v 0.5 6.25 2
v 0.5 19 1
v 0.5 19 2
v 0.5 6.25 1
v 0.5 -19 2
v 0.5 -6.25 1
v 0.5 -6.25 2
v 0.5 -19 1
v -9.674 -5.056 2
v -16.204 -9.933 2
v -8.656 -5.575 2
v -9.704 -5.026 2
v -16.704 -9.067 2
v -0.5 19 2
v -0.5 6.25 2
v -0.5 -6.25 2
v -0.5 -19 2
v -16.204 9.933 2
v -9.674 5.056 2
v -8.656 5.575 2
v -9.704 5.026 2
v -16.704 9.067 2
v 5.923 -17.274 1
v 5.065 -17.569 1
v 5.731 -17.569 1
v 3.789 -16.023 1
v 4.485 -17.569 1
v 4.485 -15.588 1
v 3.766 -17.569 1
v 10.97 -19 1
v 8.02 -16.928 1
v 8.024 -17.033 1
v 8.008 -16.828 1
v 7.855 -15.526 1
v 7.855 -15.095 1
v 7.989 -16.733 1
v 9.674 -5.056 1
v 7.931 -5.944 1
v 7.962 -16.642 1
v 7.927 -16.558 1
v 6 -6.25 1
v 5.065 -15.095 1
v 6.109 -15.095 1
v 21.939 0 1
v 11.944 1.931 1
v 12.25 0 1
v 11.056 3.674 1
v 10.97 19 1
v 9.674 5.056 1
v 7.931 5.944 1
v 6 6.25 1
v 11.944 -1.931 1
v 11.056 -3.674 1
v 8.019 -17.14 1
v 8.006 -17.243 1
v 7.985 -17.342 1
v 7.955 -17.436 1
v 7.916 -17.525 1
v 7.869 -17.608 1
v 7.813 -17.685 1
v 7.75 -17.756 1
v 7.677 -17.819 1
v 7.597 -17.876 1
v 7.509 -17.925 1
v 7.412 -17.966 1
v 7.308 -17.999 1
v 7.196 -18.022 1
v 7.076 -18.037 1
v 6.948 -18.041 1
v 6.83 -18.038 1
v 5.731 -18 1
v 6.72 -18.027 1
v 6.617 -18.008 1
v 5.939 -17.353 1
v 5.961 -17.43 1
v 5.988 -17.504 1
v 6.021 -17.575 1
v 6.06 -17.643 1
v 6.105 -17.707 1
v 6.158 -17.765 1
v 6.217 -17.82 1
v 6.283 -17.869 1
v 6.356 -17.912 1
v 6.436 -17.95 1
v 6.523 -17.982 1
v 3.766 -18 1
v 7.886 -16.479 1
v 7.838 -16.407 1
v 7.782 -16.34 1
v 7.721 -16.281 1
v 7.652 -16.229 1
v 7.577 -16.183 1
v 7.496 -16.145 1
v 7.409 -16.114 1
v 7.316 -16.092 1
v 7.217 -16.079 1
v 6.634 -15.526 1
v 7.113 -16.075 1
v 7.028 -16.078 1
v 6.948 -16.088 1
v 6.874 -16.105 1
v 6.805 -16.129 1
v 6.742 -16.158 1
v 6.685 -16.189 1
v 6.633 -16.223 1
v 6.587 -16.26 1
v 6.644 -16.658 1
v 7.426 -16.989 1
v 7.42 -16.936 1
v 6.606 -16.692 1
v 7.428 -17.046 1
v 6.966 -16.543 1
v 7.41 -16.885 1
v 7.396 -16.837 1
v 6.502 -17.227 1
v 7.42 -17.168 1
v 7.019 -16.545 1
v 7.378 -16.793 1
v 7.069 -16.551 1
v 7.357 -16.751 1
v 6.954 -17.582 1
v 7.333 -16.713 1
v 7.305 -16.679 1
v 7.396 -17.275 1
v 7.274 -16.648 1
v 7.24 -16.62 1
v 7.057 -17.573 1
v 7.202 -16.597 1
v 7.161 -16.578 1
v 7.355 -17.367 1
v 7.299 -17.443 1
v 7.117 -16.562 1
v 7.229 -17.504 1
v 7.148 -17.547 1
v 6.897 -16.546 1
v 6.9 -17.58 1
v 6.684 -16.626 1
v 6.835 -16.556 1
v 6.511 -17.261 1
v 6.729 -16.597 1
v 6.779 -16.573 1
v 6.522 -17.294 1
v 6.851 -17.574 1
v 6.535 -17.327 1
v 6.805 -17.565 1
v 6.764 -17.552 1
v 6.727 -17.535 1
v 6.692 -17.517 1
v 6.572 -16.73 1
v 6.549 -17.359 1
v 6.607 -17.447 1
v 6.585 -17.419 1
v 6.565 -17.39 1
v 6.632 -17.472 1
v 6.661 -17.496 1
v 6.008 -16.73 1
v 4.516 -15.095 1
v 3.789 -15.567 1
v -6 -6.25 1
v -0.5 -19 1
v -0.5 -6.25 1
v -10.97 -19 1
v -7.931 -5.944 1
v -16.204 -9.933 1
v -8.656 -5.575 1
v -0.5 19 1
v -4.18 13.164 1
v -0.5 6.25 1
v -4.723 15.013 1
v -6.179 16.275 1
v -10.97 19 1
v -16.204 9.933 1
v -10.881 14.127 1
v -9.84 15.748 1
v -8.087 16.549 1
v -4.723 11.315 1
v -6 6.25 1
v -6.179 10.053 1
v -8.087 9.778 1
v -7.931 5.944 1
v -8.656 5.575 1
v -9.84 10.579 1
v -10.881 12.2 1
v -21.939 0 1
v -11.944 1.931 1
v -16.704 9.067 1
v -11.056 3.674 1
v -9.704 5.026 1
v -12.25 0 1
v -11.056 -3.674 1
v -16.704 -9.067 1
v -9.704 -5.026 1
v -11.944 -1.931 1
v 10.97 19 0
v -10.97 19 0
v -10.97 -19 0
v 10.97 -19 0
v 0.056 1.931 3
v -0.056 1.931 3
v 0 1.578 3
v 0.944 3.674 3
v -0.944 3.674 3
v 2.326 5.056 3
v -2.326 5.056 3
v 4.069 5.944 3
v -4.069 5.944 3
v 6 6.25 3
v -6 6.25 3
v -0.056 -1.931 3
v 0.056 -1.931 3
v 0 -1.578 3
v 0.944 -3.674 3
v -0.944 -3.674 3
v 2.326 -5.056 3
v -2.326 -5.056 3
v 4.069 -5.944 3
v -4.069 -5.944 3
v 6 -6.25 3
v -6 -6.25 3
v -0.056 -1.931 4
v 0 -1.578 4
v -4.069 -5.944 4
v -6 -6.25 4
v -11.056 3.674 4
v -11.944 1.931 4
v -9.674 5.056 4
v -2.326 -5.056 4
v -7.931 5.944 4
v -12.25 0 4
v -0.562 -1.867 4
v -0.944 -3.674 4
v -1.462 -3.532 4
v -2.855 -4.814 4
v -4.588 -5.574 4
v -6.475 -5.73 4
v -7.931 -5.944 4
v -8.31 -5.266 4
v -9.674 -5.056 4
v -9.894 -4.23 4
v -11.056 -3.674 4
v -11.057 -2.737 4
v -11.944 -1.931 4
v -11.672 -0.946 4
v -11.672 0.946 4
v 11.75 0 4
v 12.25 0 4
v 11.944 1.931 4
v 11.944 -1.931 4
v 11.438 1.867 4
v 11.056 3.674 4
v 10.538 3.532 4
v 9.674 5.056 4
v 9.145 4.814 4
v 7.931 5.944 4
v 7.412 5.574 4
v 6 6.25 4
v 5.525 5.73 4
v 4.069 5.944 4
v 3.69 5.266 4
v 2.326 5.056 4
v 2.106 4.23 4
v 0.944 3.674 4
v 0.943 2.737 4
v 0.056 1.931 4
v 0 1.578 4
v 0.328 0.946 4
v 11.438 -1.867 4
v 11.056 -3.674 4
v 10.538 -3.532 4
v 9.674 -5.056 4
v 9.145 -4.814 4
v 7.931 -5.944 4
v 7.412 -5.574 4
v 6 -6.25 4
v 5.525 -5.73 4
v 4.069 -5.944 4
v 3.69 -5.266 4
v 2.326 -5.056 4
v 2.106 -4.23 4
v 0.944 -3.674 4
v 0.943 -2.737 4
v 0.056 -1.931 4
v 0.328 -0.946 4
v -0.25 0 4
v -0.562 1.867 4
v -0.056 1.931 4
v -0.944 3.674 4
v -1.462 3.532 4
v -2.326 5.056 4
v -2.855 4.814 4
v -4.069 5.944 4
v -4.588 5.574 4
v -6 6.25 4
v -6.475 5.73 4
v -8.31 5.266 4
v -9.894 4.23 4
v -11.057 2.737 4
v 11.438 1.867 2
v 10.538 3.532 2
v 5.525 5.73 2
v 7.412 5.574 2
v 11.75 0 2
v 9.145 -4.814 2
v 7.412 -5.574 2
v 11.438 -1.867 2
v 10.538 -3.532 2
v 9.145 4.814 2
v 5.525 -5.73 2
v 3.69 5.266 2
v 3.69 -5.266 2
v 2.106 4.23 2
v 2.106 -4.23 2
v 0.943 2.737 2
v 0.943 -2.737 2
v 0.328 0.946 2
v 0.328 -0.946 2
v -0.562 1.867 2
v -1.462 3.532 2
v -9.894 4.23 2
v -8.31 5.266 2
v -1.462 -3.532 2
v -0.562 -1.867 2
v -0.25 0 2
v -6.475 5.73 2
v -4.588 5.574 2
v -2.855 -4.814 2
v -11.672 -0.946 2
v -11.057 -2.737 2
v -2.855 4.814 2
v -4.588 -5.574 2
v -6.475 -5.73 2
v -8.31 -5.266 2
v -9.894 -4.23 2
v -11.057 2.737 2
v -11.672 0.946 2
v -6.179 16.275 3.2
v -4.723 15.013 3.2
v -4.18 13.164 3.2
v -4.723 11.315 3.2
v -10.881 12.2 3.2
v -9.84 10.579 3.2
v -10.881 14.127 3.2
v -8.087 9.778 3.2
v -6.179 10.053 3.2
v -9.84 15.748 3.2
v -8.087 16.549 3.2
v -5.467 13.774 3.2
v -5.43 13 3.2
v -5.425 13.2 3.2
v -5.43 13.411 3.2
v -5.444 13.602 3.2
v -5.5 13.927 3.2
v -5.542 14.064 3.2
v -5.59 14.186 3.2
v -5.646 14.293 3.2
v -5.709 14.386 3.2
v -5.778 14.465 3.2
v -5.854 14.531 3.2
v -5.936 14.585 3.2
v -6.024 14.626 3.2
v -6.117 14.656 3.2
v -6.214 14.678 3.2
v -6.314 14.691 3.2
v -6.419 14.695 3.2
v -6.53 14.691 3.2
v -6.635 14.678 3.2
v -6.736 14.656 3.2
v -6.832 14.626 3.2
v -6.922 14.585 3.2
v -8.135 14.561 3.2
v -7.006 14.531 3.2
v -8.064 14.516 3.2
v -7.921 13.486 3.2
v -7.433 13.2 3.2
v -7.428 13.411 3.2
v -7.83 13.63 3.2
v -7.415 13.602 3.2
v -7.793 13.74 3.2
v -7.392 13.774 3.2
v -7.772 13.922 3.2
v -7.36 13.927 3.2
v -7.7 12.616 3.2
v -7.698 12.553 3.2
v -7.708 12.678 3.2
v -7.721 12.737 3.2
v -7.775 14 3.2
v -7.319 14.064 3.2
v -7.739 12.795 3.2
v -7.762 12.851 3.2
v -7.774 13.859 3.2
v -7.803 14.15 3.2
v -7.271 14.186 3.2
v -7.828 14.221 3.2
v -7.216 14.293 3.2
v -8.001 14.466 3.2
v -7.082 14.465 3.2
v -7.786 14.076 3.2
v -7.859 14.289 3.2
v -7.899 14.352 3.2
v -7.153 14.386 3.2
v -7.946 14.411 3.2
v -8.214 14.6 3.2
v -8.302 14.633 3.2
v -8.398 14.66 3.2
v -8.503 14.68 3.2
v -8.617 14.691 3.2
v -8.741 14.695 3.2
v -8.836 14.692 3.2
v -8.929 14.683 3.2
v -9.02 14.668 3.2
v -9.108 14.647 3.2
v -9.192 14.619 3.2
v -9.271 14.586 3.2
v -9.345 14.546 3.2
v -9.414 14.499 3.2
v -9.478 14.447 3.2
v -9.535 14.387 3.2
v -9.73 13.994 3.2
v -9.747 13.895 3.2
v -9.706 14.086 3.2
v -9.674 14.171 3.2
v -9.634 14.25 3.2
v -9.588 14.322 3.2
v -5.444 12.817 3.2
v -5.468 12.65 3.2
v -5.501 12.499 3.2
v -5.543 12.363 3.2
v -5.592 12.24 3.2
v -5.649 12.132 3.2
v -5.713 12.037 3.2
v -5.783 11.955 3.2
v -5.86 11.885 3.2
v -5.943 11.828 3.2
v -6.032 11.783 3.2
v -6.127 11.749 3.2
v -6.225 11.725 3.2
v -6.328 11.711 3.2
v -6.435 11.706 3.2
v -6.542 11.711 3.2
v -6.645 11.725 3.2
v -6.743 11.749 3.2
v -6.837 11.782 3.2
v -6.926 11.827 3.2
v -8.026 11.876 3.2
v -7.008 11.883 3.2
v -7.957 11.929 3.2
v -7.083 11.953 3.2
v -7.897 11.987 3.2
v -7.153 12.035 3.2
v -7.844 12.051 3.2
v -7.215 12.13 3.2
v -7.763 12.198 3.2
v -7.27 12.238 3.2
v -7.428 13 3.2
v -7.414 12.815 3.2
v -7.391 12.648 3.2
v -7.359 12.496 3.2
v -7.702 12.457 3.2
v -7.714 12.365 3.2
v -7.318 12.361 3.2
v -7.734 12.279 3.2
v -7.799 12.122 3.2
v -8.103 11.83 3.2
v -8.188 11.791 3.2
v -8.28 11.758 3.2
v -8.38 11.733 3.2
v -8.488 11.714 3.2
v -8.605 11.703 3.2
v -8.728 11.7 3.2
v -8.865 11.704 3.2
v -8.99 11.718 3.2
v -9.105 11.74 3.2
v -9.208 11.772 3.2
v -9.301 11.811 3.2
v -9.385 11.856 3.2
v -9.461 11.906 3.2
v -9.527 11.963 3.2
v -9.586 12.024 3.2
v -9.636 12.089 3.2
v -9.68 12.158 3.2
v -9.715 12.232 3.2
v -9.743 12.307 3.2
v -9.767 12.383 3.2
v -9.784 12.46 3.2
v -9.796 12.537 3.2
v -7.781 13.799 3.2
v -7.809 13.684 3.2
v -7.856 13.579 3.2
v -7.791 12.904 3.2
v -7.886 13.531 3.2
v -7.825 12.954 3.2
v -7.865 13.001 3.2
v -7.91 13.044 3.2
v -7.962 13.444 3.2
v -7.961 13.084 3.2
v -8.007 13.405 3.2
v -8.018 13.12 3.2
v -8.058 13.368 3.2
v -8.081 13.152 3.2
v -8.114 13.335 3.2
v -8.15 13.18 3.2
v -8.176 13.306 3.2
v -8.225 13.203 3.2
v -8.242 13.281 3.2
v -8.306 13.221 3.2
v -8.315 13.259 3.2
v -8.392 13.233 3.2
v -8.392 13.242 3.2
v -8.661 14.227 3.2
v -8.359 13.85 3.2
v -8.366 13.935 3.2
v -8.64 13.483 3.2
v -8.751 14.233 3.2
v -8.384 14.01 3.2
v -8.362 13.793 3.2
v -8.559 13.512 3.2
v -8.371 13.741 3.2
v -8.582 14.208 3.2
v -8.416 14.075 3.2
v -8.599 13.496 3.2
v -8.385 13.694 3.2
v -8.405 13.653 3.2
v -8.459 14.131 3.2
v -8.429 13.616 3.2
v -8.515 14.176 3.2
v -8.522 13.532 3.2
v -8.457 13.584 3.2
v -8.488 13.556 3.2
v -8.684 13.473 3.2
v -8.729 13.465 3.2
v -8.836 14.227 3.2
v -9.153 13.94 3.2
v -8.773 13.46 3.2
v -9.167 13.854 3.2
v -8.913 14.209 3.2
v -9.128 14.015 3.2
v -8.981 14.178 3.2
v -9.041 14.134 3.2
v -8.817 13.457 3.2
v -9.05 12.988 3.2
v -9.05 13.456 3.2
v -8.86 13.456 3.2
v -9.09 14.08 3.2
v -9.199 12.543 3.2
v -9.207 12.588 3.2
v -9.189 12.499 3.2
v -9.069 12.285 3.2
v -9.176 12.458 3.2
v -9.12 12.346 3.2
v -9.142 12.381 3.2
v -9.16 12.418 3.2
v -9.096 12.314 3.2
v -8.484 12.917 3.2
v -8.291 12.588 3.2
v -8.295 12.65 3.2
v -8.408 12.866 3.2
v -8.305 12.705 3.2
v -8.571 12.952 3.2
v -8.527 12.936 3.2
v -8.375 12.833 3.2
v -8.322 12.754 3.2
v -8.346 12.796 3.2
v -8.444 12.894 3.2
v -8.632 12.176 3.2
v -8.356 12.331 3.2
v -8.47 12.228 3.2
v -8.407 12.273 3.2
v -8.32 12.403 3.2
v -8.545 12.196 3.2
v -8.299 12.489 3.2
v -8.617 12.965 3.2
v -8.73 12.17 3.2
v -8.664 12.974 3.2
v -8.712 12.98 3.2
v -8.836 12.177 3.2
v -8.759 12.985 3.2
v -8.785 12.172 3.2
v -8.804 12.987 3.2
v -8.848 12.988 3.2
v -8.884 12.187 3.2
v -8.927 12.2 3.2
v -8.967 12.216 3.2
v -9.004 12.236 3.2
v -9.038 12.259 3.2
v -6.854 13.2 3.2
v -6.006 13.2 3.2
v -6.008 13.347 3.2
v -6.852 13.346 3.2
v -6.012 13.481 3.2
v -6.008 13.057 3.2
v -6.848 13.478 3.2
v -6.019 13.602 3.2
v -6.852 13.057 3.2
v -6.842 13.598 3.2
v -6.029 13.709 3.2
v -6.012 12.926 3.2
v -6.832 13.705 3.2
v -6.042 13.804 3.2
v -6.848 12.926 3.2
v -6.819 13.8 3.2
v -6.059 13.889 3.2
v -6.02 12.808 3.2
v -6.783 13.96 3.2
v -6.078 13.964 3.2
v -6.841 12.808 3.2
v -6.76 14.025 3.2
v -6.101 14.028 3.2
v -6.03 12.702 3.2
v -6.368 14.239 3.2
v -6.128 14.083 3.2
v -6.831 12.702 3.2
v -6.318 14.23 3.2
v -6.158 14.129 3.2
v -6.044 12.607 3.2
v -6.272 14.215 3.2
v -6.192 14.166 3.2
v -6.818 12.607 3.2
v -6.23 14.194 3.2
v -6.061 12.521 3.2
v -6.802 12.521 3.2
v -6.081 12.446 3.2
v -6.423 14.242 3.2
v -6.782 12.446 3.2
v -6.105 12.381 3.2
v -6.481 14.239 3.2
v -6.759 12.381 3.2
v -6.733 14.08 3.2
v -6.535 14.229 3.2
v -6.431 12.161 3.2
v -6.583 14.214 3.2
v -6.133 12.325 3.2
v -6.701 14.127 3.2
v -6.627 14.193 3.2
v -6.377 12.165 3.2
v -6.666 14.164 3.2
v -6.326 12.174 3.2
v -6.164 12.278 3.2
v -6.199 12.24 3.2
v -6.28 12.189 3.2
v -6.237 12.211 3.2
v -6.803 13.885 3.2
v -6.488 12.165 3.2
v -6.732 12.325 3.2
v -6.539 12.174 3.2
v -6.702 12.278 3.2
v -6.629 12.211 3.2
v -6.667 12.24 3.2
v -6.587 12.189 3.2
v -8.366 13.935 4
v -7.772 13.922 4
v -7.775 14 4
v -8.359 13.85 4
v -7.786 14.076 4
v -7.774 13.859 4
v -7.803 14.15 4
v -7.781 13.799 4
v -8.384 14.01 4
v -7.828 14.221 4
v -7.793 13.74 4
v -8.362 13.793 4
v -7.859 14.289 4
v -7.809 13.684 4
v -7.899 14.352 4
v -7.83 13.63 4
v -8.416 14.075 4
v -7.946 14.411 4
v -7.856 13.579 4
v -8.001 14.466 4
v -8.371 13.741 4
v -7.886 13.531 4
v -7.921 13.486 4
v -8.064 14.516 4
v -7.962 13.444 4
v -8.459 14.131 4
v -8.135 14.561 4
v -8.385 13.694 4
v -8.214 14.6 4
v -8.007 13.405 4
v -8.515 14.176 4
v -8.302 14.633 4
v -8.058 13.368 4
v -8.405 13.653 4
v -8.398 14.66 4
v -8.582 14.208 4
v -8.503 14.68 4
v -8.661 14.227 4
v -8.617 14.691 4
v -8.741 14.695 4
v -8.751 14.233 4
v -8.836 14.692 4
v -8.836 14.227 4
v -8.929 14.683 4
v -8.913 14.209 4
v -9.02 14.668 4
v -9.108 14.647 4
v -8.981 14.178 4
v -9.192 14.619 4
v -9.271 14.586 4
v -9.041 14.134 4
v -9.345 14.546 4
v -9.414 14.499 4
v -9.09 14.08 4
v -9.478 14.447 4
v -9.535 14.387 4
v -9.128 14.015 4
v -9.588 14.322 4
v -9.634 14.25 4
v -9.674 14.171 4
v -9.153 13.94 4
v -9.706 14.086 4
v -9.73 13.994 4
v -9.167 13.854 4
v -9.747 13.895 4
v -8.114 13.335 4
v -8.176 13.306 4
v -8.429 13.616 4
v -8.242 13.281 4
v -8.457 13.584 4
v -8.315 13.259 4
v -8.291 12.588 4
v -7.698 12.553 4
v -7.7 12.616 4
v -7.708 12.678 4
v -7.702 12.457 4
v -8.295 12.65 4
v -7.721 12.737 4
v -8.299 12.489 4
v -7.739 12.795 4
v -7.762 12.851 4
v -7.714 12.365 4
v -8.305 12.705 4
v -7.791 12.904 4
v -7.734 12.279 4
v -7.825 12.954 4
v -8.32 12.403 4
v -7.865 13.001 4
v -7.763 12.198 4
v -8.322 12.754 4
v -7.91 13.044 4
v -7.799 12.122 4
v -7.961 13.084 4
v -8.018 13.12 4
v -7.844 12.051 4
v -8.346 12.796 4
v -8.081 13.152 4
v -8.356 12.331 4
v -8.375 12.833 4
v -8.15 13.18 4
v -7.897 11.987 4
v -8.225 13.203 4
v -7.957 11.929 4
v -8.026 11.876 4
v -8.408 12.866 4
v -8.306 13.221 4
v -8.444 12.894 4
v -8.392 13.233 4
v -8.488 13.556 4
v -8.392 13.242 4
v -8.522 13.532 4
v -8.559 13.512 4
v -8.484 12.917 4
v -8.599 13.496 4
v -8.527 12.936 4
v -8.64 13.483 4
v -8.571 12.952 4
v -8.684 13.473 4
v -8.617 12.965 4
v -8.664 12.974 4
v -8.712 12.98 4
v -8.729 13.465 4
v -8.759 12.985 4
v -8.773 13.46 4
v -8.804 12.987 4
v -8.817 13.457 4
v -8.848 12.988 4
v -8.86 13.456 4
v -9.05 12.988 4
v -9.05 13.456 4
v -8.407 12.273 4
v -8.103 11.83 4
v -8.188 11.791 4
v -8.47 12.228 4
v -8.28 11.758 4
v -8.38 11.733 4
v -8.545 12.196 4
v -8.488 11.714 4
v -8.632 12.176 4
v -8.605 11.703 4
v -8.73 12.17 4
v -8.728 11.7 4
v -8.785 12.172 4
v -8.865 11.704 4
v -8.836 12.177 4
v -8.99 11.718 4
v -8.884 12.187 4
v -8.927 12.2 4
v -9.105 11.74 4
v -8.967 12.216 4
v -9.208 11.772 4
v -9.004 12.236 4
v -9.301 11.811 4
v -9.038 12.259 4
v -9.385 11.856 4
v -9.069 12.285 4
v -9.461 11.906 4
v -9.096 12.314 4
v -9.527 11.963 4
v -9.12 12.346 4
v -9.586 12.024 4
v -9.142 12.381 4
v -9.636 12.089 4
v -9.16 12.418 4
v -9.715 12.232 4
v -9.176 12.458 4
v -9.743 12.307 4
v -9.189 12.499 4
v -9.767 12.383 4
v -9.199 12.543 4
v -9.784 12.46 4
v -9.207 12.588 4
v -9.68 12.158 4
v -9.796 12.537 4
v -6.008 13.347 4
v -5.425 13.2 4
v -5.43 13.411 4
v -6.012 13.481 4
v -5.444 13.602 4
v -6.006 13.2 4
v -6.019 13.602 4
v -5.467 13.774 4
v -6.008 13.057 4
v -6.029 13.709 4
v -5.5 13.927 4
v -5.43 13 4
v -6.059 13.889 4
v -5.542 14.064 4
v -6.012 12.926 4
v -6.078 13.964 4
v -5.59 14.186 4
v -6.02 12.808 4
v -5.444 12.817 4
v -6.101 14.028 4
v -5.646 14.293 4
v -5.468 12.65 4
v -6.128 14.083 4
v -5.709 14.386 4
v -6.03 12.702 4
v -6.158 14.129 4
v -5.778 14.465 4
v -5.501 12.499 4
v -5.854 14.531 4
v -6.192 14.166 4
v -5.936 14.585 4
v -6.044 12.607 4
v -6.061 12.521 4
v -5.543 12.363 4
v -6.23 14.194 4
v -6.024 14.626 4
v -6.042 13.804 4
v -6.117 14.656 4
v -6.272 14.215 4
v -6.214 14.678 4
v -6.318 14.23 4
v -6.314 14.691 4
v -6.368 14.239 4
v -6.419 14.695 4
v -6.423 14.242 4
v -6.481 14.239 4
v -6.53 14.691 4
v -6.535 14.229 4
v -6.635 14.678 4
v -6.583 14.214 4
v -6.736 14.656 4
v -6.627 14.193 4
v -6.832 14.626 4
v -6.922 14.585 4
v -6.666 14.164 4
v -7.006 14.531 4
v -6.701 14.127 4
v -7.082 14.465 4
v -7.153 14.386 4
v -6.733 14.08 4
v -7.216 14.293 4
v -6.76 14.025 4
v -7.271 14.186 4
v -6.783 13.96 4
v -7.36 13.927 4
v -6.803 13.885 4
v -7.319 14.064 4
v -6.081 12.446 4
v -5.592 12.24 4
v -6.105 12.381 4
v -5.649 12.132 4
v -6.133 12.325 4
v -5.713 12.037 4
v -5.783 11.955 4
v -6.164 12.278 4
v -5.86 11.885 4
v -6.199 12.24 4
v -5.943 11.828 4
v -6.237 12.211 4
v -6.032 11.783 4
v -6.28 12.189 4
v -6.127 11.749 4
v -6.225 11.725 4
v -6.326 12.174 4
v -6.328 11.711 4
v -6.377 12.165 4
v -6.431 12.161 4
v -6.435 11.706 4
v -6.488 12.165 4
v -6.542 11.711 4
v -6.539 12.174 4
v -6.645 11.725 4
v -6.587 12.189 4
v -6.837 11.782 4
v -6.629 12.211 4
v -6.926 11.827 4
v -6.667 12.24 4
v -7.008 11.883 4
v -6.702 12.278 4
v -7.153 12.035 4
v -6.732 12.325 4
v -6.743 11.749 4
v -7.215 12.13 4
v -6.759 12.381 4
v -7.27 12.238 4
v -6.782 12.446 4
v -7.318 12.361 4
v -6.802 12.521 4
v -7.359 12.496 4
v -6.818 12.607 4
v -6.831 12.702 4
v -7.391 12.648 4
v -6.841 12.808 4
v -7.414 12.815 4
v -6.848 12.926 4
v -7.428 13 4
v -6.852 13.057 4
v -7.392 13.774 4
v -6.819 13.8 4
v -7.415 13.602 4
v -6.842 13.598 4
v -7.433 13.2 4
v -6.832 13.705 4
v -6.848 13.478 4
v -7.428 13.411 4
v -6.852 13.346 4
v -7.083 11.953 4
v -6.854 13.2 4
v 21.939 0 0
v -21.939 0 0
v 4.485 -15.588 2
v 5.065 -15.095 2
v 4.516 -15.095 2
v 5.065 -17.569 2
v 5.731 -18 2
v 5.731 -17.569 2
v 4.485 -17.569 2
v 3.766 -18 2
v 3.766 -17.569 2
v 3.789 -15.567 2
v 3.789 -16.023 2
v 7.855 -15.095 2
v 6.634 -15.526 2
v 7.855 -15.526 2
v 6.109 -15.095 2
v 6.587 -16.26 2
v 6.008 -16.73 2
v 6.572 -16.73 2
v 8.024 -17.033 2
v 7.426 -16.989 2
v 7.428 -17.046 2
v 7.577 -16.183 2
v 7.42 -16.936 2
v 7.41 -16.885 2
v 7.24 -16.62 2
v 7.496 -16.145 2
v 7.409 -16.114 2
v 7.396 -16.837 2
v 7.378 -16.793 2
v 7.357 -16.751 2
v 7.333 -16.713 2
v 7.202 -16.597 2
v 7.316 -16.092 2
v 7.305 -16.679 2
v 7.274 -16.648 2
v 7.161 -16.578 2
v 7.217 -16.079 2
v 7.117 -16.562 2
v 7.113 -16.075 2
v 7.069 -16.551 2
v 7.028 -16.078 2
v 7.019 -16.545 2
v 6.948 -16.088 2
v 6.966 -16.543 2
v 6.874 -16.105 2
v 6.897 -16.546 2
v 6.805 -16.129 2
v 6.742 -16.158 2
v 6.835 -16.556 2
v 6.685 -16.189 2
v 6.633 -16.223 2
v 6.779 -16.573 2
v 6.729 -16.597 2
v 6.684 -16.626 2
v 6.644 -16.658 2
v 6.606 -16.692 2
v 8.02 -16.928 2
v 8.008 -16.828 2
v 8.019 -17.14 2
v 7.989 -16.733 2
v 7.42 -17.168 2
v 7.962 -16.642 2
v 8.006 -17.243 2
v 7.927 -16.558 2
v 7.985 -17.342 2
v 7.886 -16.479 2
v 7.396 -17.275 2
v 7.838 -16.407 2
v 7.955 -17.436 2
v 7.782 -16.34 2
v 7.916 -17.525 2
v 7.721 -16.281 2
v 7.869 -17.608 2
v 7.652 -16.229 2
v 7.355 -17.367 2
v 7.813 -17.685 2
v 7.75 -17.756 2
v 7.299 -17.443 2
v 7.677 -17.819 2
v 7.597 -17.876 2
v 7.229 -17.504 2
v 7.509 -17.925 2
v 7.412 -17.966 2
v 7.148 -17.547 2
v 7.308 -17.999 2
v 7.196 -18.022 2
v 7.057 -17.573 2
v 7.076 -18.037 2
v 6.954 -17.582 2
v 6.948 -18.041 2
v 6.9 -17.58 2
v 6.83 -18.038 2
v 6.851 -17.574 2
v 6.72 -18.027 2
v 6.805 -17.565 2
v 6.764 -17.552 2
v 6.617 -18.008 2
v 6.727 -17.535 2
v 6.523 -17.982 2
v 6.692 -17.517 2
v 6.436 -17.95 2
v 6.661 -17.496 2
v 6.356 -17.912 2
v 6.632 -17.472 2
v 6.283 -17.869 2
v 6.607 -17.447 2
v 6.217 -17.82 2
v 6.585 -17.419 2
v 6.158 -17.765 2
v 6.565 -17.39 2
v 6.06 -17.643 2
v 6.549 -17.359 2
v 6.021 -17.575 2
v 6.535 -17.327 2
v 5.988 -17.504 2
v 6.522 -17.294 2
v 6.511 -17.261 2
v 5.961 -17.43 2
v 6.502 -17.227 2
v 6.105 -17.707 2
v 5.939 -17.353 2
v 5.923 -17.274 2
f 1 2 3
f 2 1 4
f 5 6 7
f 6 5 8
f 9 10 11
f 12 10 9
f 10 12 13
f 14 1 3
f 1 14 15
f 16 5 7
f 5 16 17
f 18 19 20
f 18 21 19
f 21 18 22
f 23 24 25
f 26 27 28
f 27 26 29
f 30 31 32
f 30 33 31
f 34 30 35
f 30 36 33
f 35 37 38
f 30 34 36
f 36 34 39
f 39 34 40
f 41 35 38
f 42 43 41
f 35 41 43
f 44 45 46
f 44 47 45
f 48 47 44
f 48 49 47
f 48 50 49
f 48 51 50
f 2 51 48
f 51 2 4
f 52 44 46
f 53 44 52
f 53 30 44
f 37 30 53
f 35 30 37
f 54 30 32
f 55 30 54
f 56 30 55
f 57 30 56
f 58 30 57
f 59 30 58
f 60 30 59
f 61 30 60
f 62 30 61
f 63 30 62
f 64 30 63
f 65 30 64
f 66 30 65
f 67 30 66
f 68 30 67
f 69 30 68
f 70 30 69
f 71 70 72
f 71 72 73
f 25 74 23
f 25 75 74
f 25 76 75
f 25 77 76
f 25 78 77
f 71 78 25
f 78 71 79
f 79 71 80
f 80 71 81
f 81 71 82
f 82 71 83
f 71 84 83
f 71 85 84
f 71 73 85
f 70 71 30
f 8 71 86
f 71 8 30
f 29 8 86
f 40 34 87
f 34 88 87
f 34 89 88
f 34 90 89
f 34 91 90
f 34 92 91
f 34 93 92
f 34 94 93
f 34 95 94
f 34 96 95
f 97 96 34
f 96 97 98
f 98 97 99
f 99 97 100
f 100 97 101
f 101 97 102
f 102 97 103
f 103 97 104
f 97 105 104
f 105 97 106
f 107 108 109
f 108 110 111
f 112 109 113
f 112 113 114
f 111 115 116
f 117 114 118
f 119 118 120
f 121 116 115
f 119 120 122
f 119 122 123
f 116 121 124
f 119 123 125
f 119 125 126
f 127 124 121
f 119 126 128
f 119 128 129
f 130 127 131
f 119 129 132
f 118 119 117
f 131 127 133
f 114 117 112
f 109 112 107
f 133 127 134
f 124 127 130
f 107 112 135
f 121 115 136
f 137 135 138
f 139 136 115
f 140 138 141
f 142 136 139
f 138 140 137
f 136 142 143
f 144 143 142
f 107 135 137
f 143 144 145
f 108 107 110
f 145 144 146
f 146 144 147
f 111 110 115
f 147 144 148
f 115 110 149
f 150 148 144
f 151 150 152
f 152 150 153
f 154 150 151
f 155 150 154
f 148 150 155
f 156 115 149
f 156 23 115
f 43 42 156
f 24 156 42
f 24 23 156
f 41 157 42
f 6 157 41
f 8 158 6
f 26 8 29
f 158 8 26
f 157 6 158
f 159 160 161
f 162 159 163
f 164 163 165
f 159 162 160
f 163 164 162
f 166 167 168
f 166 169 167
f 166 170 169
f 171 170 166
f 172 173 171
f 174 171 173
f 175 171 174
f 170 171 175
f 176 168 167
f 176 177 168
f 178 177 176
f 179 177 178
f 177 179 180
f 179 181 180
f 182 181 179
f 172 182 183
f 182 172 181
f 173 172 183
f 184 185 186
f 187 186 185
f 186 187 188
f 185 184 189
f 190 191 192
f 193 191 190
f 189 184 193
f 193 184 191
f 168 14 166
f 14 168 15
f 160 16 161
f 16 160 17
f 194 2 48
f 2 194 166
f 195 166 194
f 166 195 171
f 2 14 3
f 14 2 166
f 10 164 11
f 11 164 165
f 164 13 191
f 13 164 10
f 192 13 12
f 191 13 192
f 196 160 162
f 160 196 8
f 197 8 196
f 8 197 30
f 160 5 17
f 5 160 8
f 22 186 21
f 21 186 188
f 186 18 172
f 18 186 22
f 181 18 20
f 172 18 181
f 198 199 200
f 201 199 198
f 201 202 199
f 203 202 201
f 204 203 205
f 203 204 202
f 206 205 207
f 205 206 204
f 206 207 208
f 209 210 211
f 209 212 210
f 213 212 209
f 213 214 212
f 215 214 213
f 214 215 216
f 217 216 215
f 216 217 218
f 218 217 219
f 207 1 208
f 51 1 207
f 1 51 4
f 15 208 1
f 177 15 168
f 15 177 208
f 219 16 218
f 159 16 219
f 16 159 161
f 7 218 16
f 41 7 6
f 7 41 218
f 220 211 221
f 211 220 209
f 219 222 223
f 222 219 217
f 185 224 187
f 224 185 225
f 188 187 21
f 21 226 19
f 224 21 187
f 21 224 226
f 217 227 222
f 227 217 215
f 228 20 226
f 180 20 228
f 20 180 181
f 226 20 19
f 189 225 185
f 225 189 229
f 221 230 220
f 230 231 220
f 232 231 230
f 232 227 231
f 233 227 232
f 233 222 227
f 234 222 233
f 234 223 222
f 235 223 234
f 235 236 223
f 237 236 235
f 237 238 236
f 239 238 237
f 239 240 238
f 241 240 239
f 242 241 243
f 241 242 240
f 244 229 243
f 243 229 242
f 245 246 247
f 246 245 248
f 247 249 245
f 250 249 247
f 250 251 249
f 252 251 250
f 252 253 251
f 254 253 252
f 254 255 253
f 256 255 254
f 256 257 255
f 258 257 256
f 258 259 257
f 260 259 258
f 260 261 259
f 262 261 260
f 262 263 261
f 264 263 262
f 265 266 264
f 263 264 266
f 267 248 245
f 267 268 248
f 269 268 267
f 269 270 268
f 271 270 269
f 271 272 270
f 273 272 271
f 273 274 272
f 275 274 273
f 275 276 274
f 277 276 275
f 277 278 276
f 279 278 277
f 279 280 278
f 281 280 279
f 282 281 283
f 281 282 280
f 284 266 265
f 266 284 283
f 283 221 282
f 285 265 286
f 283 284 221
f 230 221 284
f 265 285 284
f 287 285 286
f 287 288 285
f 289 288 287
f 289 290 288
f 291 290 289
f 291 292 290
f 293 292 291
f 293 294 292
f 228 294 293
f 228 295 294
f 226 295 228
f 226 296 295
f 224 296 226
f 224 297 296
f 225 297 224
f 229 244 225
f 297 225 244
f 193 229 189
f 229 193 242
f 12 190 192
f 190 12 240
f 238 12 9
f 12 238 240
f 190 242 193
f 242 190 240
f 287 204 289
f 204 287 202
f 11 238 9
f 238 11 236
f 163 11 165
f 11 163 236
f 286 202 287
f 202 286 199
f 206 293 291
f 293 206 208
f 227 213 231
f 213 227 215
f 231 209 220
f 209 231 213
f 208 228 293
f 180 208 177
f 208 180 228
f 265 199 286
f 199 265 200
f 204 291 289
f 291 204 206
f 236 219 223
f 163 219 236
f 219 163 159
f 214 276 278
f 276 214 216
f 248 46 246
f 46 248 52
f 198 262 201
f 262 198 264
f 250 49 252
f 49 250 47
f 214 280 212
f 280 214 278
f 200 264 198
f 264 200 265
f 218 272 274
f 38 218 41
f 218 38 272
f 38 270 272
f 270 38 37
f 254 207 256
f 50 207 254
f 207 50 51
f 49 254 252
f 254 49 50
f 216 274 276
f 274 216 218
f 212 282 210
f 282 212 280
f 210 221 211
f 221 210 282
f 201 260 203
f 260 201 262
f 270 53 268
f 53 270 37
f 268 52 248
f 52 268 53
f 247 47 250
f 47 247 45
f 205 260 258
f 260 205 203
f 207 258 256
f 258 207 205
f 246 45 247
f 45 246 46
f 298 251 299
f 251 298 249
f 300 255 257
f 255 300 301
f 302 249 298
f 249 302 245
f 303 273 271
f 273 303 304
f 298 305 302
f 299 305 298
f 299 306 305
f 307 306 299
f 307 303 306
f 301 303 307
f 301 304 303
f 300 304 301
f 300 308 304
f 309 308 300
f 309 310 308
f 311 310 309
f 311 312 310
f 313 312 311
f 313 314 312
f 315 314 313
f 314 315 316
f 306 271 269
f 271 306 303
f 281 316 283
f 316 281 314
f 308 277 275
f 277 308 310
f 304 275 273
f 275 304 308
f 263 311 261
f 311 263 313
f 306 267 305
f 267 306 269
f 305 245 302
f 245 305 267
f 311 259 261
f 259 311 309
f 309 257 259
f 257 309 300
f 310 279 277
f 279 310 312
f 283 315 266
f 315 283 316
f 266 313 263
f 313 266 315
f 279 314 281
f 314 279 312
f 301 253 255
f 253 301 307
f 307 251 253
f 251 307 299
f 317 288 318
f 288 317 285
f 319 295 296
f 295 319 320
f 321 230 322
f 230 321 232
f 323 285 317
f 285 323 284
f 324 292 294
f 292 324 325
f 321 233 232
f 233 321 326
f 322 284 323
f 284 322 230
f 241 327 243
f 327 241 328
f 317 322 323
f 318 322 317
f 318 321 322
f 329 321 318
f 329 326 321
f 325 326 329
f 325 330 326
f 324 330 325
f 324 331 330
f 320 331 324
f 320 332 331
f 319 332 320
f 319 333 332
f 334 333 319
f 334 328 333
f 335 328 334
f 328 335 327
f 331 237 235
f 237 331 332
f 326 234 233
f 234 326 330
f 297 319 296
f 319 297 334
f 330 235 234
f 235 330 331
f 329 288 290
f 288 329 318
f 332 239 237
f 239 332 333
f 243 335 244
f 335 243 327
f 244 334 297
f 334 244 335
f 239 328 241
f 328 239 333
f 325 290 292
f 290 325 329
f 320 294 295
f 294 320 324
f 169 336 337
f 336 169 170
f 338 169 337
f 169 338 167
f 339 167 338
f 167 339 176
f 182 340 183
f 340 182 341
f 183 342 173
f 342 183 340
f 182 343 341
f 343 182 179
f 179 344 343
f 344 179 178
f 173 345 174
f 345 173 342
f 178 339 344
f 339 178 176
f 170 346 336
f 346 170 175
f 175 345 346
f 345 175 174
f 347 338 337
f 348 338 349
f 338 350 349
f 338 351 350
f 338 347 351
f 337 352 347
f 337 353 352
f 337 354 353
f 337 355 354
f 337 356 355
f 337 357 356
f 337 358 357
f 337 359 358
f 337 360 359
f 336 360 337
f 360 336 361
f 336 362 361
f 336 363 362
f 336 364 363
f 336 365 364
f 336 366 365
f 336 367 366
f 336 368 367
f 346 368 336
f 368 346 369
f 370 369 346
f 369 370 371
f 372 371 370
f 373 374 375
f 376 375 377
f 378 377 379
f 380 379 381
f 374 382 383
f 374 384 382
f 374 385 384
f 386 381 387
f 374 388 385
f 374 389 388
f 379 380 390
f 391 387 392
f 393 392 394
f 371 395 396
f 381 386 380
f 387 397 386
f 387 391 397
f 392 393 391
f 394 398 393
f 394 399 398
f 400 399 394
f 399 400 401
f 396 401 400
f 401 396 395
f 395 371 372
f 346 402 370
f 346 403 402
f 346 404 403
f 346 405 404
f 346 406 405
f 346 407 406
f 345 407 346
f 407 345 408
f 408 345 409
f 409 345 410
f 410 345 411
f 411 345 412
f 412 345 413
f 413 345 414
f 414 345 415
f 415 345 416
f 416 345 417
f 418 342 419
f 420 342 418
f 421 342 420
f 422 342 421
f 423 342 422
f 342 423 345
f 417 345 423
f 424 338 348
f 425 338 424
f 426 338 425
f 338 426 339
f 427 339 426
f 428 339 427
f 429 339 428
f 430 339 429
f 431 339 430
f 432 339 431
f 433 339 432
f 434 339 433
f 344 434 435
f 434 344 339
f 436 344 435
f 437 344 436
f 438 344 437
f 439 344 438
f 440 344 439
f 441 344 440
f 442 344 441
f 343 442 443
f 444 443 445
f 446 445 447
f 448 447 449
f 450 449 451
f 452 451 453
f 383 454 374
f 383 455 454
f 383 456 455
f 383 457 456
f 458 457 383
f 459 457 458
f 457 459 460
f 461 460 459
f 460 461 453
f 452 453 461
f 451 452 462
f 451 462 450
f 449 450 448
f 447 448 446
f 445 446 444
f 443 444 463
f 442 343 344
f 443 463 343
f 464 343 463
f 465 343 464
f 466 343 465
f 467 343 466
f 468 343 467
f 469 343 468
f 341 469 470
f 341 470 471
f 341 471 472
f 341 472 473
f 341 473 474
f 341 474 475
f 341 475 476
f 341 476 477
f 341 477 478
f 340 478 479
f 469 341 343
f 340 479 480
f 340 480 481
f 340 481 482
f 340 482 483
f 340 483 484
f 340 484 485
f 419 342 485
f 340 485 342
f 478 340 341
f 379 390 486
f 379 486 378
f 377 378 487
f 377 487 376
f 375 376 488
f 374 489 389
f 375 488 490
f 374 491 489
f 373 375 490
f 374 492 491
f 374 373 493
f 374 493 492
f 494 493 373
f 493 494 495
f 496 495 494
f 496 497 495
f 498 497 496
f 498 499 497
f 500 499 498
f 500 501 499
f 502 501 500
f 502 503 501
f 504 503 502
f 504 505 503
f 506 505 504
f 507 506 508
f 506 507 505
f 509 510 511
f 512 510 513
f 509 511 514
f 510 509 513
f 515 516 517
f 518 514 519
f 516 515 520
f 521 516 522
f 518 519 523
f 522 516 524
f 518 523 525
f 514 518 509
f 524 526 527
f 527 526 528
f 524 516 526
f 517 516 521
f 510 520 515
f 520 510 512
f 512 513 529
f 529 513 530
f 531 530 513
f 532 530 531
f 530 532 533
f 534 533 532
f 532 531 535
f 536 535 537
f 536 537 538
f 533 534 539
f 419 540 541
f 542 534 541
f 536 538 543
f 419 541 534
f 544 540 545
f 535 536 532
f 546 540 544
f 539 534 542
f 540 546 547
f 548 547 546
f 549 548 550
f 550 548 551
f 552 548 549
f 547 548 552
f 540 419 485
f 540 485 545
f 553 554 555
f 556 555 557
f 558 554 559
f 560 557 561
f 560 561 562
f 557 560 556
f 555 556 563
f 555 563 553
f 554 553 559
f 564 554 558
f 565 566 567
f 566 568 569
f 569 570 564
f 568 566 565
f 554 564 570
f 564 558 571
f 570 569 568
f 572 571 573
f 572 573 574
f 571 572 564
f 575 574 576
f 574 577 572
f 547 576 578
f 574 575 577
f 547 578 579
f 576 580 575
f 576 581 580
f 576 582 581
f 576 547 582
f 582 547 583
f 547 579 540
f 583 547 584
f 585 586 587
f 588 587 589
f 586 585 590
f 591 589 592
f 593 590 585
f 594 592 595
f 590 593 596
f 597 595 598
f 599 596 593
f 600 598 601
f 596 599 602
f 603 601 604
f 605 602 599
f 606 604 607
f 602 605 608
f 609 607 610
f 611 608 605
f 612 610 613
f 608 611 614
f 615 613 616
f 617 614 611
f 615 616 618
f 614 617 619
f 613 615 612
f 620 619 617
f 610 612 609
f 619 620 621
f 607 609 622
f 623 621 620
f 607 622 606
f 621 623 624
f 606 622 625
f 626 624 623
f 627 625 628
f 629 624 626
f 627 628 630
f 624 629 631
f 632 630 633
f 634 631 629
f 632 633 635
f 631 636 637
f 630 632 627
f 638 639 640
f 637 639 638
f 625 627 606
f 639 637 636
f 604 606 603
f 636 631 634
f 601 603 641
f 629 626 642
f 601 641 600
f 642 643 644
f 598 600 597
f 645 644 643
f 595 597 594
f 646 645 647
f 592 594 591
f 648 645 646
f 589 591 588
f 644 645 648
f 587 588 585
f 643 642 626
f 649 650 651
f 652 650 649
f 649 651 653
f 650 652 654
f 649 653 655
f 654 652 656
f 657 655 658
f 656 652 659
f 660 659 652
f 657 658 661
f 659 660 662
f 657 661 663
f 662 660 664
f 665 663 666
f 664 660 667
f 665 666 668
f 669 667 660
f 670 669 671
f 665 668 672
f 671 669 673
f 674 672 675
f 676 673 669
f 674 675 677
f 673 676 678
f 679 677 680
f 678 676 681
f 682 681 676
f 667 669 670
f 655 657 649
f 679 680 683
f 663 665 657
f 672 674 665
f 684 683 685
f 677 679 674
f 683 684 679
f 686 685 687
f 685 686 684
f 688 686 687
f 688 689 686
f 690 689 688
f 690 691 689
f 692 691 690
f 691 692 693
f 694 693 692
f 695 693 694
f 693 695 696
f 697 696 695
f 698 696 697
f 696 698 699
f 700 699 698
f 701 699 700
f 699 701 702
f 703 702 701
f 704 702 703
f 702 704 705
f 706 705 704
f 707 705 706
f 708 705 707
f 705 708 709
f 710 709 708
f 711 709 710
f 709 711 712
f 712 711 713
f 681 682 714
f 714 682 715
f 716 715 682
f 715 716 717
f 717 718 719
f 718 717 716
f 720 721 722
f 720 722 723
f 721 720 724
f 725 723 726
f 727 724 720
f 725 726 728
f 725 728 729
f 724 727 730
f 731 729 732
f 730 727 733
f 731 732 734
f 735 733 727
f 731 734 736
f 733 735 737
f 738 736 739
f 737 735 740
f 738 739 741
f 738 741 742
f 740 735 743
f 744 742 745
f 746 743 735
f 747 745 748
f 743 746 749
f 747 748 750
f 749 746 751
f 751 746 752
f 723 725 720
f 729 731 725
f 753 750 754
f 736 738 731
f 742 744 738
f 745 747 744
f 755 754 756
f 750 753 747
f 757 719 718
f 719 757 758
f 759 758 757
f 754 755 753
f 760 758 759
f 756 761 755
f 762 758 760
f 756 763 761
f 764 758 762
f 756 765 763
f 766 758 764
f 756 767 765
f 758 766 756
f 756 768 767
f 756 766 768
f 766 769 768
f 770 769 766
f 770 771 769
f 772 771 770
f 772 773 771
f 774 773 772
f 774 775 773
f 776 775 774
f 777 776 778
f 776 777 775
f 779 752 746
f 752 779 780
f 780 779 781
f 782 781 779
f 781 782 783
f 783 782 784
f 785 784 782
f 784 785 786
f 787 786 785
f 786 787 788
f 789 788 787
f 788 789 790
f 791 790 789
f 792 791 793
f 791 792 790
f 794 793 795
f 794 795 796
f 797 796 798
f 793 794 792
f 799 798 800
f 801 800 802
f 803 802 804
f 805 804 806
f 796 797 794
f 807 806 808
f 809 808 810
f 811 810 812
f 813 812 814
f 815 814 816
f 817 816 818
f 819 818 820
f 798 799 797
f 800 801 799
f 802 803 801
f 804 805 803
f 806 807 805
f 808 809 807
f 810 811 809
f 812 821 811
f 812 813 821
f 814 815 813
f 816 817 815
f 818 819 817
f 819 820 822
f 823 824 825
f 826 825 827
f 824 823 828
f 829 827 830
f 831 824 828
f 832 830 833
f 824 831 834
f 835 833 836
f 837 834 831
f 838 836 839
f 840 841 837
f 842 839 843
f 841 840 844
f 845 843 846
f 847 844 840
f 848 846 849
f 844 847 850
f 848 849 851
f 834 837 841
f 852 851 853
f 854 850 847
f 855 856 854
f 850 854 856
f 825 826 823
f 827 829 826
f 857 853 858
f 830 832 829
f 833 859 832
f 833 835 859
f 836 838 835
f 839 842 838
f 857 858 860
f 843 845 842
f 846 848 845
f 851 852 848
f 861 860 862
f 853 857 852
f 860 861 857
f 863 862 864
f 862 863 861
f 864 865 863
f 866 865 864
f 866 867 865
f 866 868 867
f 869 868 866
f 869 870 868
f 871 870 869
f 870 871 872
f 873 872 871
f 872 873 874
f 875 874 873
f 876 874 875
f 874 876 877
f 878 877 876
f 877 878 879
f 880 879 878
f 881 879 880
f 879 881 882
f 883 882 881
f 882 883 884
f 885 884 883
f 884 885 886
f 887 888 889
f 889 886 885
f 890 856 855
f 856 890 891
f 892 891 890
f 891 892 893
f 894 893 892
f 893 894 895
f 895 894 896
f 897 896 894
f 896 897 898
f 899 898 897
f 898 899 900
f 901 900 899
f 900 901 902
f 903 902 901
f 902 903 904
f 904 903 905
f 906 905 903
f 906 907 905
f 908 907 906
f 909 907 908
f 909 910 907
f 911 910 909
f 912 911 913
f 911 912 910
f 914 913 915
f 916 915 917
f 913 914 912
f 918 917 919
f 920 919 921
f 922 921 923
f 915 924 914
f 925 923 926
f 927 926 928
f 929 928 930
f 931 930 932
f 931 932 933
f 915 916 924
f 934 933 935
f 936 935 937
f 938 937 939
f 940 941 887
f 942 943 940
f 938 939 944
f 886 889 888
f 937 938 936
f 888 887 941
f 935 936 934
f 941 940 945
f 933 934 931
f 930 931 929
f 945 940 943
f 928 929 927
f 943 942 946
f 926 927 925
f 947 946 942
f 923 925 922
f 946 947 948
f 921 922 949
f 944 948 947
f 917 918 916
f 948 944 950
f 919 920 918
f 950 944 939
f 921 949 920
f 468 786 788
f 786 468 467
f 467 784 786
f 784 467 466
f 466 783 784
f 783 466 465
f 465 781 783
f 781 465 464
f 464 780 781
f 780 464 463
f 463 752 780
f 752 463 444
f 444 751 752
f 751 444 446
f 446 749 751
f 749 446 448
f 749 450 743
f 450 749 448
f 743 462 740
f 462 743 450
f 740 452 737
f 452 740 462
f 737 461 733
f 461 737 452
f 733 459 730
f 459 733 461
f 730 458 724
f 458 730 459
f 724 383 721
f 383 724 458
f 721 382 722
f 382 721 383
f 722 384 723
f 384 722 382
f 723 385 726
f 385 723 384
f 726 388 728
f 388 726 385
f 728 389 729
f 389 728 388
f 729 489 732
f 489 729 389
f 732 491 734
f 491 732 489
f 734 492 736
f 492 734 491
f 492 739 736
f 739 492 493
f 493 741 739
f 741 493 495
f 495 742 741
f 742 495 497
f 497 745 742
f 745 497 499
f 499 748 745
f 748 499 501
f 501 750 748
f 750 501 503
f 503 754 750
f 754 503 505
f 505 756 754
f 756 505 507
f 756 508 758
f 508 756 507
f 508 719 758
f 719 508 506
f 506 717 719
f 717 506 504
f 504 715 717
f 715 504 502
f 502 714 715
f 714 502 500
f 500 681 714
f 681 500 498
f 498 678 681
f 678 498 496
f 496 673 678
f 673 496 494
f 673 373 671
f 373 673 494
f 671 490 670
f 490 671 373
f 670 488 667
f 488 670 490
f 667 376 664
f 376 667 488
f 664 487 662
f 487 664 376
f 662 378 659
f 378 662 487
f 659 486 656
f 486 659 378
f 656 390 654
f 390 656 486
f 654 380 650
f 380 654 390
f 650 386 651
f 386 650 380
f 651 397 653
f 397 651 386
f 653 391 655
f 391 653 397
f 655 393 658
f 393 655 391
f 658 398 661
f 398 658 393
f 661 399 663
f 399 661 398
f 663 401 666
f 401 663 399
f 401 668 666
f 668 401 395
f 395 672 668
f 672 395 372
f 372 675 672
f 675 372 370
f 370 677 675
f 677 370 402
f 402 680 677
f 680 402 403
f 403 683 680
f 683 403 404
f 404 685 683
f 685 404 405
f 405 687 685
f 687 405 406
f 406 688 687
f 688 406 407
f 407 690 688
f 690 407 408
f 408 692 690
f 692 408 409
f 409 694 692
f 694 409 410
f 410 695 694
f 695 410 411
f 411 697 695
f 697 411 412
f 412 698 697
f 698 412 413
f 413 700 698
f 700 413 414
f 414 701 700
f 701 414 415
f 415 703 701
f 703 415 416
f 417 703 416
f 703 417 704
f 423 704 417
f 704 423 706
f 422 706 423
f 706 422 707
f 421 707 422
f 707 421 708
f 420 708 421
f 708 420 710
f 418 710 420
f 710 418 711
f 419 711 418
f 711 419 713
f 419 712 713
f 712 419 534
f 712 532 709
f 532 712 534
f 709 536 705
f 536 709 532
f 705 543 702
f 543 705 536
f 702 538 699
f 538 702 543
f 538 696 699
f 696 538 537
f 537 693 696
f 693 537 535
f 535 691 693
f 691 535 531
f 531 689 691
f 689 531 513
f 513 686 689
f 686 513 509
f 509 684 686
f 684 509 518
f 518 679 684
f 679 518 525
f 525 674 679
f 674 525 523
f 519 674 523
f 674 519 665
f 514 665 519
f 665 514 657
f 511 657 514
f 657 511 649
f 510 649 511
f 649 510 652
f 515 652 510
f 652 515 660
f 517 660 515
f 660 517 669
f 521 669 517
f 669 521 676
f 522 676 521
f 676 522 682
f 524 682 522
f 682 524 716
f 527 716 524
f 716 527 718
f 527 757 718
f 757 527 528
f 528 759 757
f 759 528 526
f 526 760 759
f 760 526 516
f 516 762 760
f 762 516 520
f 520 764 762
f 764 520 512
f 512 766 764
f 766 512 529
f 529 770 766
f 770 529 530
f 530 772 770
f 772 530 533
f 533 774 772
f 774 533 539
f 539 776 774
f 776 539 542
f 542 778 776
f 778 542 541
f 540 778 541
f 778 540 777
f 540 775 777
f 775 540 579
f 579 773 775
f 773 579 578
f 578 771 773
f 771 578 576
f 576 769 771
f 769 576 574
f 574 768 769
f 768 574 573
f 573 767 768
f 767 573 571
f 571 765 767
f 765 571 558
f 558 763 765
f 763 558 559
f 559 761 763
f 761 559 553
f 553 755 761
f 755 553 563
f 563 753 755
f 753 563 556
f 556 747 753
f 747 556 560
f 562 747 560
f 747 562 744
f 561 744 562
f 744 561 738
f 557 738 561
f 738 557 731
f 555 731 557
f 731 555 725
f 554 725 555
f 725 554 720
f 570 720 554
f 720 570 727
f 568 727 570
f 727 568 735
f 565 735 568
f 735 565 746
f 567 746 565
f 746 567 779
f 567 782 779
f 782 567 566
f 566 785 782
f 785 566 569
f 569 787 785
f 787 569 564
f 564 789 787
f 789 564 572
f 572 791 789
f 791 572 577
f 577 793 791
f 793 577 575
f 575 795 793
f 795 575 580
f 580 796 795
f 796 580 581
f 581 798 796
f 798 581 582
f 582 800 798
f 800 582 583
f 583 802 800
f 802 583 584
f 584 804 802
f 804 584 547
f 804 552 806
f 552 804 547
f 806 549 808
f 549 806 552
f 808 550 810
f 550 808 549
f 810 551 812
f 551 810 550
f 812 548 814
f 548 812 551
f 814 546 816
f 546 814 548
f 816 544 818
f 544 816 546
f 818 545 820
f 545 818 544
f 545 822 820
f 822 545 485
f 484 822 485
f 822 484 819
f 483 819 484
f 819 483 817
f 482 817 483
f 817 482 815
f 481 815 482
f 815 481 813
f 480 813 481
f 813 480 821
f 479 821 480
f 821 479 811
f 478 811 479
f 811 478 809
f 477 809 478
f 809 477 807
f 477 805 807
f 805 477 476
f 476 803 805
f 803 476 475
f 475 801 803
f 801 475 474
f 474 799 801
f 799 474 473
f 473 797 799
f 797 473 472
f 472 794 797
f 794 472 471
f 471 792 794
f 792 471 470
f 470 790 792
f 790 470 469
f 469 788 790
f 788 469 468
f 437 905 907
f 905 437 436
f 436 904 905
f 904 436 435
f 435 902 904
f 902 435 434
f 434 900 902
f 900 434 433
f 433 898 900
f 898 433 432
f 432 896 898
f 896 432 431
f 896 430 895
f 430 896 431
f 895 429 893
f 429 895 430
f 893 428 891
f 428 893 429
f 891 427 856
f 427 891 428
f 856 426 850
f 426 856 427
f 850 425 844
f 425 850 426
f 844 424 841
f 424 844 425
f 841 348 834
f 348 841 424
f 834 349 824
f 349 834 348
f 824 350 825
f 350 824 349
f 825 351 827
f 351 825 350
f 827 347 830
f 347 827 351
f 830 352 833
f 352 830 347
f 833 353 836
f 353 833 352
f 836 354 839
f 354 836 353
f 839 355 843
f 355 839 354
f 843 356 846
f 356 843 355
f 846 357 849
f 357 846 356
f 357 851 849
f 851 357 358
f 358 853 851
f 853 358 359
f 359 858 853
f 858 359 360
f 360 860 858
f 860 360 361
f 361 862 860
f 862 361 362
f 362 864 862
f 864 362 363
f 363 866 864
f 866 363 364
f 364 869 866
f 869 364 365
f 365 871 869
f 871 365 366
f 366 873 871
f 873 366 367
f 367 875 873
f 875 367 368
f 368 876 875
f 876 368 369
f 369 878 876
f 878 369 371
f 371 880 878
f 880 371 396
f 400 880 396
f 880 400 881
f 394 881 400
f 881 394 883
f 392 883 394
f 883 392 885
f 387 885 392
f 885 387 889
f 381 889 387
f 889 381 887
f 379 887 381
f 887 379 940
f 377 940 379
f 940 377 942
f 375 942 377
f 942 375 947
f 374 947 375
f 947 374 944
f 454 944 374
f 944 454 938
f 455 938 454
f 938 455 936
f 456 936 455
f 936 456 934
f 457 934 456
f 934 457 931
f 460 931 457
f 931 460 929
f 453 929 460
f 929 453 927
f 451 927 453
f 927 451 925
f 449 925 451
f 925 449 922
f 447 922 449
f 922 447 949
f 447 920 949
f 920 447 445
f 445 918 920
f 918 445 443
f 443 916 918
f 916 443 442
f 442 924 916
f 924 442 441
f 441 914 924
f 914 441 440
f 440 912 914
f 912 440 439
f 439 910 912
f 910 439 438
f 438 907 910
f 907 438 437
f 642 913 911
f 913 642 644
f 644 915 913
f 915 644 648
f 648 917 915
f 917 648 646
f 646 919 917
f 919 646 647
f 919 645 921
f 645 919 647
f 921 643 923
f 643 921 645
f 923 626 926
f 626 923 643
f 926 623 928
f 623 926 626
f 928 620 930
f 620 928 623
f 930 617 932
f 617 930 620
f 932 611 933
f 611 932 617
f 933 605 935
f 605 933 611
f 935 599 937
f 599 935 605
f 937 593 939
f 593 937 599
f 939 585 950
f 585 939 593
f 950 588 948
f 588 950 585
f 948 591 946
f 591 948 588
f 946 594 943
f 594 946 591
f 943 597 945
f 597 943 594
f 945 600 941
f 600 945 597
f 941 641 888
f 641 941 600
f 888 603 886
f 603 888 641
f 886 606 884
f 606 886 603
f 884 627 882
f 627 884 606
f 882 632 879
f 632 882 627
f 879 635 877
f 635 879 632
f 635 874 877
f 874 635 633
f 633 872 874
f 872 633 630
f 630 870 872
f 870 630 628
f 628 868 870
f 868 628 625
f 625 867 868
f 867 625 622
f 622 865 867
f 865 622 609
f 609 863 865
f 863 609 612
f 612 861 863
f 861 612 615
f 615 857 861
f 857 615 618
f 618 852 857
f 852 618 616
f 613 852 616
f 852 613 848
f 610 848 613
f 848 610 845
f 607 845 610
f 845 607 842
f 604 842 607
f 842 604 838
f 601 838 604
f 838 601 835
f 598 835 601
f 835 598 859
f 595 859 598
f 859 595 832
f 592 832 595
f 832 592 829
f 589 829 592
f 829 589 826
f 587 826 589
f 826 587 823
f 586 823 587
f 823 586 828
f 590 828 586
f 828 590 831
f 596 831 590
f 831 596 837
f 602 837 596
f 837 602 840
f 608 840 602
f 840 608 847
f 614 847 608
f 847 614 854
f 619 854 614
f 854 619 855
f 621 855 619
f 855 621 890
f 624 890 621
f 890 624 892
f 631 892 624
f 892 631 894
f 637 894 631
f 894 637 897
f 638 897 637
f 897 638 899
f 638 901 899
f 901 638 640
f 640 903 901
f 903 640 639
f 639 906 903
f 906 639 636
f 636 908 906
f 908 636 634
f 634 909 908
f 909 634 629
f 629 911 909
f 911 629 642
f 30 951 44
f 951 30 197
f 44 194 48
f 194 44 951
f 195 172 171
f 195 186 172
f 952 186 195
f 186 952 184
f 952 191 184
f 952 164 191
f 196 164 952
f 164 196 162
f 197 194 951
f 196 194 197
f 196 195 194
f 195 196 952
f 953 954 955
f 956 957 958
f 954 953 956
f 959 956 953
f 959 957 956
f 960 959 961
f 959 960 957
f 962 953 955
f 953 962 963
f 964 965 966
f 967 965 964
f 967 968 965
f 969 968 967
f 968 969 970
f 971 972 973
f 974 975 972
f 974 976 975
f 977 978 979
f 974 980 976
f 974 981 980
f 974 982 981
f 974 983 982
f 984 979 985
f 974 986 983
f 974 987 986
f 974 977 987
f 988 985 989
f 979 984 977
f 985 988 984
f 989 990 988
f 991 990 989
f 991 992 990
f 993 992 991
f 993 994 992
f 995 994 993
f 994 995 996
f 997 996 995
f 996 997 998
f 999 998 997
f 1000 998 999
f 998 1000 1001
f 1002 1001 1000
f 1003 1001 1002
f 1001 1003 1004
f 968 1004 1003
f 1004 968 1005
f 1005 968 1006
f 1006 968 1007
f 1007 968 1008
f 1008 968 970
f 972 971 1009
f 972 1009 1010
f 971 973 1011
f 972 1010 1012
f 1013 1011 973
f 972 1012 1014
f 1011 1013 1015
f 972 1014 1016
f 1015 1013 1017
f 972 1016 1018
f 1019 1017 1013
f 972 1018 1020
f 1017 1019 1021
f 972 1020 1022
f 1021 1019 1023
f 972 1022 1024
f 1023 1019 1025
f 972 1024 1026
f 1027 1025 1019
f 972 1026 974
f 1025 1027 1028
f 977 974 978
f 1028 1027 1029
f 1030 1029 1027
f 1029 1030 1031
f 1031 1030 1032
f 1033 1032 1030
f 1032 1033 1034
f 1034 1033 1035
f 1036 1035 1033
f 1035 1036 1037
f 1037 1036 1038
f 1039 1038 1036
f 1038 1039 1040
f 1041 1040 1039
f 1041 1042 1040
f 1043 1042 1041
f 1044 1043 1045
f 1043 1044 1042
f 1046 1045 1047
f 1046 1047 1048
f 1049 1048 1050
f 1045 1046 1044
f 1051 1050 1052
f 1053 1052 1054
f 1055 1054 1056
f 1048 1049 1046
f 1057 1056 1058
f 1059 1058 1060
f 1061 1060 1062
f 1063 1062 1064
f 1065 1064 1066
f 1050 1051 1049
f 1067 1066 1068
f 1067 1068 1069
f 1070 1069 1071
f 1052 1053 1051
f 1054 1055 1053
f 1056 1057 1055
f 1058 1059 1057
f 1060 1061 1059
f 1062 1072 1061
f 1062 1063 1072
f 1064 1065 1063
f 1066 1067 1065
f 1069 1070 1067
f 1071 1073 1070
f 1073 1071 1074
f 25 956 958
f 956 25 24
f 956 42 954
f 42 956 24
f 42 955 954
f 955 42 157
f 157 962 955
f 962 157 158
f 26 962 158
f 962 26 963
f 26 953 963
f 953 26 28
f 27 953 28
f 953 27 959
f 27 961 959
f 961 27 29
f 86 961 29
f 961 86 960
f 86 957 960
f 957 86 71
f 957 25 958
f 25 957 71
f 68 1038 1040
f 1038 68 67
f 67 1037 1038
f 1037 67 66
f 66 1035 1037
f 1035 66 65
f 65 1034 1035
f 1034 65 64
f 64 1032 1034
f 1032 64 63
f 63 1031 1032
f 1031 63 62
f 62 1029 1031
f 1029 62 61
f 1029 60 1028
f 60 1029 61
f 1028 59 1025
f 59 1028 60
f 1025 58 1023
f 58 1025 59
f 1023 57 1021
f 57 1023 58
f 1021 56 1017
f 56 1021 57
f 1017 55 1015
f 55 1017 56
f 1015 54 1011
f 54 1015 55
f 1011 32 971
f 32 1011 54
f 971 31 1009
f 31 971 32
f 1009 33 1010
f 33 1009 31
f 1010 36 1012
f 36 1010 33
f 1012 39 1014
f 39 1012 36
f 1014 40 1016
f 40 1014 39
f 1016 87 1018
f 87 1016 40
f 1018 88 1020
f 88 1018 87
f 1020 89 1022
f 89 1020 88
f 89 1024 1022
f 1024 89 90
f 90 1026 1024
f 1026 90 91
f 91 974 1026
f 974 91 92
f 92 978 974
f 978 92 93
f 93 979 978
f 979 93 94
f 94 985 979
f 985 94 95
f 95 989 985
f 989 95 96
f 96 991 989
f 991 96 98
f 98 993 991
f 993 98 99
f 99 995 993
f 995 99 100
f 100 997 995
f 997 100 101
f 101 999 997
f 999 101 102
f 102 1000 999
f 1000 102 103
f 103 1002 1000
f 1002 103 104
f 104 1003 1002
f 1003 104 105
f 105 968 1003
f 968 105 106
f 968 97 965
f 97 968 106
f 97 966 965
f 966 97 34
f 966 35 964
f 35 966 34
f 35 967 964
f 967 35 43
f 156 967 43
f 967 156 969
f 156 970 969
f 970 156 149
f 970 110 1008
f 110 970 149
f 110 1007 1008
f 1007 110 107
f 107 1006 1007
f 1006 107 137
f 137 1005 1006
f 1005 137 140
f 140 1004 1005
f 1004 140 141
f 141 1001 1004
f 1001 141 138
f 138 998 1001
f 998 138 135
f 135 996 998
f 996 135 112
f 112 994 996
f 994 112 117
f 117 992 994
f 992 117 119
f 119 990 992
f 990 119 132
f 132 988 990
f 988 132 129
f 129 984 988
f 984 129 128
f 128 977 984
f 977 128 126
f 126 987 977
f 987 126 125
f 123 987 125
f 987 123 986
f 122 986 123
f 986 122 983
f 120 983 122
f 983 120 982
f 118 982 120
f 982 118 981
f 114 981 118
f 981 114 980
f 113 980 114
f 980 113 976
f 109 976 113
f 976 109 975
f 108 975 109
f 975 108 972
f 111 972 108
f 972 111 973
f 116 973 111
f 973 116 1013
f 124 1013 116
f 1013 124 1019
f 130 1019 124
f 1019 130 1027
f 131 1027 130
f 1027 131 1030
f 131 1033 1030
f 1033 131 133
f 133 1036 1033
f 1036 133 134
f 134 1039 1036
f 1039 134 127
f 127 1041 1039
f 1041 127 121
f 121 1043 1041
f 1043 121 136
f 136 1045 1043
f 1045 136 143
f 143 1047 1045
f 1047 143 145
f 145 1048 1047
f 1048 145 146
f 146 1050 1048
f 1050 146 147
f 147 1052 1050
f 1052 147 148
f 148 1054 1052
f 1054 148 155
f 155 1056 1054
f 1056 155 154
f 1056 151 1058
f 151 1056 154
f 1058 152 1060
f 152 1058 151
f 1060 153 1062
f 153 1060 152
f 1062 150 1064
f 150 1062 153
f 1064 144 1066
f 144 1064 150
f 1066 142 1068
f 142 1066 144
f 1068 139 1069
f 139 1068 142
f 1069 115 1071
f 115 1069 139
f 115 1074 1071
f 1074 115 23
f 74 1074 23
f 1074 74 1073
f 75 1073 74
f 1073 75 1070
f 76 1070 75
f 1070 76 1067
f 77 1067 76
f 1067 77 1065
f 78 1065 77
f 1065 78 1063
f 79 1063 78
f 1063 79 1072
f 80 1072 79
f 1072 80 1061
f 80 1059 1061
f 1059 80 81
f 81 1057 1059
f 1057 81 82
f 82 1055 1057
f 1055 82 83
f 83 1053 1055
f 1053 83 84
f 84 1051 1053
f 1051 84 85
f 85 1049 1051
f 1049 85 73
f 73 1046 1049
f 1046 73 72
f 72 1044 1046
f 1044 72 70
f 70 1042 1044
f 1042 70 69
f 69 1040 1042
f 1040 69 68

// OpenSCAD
include <../Scripts/18xx tiles basic functions.scad>
hex("Green");
put_tilenr("15");
double_city(v=[0,2,3,1]);
put_value("30",-30);
